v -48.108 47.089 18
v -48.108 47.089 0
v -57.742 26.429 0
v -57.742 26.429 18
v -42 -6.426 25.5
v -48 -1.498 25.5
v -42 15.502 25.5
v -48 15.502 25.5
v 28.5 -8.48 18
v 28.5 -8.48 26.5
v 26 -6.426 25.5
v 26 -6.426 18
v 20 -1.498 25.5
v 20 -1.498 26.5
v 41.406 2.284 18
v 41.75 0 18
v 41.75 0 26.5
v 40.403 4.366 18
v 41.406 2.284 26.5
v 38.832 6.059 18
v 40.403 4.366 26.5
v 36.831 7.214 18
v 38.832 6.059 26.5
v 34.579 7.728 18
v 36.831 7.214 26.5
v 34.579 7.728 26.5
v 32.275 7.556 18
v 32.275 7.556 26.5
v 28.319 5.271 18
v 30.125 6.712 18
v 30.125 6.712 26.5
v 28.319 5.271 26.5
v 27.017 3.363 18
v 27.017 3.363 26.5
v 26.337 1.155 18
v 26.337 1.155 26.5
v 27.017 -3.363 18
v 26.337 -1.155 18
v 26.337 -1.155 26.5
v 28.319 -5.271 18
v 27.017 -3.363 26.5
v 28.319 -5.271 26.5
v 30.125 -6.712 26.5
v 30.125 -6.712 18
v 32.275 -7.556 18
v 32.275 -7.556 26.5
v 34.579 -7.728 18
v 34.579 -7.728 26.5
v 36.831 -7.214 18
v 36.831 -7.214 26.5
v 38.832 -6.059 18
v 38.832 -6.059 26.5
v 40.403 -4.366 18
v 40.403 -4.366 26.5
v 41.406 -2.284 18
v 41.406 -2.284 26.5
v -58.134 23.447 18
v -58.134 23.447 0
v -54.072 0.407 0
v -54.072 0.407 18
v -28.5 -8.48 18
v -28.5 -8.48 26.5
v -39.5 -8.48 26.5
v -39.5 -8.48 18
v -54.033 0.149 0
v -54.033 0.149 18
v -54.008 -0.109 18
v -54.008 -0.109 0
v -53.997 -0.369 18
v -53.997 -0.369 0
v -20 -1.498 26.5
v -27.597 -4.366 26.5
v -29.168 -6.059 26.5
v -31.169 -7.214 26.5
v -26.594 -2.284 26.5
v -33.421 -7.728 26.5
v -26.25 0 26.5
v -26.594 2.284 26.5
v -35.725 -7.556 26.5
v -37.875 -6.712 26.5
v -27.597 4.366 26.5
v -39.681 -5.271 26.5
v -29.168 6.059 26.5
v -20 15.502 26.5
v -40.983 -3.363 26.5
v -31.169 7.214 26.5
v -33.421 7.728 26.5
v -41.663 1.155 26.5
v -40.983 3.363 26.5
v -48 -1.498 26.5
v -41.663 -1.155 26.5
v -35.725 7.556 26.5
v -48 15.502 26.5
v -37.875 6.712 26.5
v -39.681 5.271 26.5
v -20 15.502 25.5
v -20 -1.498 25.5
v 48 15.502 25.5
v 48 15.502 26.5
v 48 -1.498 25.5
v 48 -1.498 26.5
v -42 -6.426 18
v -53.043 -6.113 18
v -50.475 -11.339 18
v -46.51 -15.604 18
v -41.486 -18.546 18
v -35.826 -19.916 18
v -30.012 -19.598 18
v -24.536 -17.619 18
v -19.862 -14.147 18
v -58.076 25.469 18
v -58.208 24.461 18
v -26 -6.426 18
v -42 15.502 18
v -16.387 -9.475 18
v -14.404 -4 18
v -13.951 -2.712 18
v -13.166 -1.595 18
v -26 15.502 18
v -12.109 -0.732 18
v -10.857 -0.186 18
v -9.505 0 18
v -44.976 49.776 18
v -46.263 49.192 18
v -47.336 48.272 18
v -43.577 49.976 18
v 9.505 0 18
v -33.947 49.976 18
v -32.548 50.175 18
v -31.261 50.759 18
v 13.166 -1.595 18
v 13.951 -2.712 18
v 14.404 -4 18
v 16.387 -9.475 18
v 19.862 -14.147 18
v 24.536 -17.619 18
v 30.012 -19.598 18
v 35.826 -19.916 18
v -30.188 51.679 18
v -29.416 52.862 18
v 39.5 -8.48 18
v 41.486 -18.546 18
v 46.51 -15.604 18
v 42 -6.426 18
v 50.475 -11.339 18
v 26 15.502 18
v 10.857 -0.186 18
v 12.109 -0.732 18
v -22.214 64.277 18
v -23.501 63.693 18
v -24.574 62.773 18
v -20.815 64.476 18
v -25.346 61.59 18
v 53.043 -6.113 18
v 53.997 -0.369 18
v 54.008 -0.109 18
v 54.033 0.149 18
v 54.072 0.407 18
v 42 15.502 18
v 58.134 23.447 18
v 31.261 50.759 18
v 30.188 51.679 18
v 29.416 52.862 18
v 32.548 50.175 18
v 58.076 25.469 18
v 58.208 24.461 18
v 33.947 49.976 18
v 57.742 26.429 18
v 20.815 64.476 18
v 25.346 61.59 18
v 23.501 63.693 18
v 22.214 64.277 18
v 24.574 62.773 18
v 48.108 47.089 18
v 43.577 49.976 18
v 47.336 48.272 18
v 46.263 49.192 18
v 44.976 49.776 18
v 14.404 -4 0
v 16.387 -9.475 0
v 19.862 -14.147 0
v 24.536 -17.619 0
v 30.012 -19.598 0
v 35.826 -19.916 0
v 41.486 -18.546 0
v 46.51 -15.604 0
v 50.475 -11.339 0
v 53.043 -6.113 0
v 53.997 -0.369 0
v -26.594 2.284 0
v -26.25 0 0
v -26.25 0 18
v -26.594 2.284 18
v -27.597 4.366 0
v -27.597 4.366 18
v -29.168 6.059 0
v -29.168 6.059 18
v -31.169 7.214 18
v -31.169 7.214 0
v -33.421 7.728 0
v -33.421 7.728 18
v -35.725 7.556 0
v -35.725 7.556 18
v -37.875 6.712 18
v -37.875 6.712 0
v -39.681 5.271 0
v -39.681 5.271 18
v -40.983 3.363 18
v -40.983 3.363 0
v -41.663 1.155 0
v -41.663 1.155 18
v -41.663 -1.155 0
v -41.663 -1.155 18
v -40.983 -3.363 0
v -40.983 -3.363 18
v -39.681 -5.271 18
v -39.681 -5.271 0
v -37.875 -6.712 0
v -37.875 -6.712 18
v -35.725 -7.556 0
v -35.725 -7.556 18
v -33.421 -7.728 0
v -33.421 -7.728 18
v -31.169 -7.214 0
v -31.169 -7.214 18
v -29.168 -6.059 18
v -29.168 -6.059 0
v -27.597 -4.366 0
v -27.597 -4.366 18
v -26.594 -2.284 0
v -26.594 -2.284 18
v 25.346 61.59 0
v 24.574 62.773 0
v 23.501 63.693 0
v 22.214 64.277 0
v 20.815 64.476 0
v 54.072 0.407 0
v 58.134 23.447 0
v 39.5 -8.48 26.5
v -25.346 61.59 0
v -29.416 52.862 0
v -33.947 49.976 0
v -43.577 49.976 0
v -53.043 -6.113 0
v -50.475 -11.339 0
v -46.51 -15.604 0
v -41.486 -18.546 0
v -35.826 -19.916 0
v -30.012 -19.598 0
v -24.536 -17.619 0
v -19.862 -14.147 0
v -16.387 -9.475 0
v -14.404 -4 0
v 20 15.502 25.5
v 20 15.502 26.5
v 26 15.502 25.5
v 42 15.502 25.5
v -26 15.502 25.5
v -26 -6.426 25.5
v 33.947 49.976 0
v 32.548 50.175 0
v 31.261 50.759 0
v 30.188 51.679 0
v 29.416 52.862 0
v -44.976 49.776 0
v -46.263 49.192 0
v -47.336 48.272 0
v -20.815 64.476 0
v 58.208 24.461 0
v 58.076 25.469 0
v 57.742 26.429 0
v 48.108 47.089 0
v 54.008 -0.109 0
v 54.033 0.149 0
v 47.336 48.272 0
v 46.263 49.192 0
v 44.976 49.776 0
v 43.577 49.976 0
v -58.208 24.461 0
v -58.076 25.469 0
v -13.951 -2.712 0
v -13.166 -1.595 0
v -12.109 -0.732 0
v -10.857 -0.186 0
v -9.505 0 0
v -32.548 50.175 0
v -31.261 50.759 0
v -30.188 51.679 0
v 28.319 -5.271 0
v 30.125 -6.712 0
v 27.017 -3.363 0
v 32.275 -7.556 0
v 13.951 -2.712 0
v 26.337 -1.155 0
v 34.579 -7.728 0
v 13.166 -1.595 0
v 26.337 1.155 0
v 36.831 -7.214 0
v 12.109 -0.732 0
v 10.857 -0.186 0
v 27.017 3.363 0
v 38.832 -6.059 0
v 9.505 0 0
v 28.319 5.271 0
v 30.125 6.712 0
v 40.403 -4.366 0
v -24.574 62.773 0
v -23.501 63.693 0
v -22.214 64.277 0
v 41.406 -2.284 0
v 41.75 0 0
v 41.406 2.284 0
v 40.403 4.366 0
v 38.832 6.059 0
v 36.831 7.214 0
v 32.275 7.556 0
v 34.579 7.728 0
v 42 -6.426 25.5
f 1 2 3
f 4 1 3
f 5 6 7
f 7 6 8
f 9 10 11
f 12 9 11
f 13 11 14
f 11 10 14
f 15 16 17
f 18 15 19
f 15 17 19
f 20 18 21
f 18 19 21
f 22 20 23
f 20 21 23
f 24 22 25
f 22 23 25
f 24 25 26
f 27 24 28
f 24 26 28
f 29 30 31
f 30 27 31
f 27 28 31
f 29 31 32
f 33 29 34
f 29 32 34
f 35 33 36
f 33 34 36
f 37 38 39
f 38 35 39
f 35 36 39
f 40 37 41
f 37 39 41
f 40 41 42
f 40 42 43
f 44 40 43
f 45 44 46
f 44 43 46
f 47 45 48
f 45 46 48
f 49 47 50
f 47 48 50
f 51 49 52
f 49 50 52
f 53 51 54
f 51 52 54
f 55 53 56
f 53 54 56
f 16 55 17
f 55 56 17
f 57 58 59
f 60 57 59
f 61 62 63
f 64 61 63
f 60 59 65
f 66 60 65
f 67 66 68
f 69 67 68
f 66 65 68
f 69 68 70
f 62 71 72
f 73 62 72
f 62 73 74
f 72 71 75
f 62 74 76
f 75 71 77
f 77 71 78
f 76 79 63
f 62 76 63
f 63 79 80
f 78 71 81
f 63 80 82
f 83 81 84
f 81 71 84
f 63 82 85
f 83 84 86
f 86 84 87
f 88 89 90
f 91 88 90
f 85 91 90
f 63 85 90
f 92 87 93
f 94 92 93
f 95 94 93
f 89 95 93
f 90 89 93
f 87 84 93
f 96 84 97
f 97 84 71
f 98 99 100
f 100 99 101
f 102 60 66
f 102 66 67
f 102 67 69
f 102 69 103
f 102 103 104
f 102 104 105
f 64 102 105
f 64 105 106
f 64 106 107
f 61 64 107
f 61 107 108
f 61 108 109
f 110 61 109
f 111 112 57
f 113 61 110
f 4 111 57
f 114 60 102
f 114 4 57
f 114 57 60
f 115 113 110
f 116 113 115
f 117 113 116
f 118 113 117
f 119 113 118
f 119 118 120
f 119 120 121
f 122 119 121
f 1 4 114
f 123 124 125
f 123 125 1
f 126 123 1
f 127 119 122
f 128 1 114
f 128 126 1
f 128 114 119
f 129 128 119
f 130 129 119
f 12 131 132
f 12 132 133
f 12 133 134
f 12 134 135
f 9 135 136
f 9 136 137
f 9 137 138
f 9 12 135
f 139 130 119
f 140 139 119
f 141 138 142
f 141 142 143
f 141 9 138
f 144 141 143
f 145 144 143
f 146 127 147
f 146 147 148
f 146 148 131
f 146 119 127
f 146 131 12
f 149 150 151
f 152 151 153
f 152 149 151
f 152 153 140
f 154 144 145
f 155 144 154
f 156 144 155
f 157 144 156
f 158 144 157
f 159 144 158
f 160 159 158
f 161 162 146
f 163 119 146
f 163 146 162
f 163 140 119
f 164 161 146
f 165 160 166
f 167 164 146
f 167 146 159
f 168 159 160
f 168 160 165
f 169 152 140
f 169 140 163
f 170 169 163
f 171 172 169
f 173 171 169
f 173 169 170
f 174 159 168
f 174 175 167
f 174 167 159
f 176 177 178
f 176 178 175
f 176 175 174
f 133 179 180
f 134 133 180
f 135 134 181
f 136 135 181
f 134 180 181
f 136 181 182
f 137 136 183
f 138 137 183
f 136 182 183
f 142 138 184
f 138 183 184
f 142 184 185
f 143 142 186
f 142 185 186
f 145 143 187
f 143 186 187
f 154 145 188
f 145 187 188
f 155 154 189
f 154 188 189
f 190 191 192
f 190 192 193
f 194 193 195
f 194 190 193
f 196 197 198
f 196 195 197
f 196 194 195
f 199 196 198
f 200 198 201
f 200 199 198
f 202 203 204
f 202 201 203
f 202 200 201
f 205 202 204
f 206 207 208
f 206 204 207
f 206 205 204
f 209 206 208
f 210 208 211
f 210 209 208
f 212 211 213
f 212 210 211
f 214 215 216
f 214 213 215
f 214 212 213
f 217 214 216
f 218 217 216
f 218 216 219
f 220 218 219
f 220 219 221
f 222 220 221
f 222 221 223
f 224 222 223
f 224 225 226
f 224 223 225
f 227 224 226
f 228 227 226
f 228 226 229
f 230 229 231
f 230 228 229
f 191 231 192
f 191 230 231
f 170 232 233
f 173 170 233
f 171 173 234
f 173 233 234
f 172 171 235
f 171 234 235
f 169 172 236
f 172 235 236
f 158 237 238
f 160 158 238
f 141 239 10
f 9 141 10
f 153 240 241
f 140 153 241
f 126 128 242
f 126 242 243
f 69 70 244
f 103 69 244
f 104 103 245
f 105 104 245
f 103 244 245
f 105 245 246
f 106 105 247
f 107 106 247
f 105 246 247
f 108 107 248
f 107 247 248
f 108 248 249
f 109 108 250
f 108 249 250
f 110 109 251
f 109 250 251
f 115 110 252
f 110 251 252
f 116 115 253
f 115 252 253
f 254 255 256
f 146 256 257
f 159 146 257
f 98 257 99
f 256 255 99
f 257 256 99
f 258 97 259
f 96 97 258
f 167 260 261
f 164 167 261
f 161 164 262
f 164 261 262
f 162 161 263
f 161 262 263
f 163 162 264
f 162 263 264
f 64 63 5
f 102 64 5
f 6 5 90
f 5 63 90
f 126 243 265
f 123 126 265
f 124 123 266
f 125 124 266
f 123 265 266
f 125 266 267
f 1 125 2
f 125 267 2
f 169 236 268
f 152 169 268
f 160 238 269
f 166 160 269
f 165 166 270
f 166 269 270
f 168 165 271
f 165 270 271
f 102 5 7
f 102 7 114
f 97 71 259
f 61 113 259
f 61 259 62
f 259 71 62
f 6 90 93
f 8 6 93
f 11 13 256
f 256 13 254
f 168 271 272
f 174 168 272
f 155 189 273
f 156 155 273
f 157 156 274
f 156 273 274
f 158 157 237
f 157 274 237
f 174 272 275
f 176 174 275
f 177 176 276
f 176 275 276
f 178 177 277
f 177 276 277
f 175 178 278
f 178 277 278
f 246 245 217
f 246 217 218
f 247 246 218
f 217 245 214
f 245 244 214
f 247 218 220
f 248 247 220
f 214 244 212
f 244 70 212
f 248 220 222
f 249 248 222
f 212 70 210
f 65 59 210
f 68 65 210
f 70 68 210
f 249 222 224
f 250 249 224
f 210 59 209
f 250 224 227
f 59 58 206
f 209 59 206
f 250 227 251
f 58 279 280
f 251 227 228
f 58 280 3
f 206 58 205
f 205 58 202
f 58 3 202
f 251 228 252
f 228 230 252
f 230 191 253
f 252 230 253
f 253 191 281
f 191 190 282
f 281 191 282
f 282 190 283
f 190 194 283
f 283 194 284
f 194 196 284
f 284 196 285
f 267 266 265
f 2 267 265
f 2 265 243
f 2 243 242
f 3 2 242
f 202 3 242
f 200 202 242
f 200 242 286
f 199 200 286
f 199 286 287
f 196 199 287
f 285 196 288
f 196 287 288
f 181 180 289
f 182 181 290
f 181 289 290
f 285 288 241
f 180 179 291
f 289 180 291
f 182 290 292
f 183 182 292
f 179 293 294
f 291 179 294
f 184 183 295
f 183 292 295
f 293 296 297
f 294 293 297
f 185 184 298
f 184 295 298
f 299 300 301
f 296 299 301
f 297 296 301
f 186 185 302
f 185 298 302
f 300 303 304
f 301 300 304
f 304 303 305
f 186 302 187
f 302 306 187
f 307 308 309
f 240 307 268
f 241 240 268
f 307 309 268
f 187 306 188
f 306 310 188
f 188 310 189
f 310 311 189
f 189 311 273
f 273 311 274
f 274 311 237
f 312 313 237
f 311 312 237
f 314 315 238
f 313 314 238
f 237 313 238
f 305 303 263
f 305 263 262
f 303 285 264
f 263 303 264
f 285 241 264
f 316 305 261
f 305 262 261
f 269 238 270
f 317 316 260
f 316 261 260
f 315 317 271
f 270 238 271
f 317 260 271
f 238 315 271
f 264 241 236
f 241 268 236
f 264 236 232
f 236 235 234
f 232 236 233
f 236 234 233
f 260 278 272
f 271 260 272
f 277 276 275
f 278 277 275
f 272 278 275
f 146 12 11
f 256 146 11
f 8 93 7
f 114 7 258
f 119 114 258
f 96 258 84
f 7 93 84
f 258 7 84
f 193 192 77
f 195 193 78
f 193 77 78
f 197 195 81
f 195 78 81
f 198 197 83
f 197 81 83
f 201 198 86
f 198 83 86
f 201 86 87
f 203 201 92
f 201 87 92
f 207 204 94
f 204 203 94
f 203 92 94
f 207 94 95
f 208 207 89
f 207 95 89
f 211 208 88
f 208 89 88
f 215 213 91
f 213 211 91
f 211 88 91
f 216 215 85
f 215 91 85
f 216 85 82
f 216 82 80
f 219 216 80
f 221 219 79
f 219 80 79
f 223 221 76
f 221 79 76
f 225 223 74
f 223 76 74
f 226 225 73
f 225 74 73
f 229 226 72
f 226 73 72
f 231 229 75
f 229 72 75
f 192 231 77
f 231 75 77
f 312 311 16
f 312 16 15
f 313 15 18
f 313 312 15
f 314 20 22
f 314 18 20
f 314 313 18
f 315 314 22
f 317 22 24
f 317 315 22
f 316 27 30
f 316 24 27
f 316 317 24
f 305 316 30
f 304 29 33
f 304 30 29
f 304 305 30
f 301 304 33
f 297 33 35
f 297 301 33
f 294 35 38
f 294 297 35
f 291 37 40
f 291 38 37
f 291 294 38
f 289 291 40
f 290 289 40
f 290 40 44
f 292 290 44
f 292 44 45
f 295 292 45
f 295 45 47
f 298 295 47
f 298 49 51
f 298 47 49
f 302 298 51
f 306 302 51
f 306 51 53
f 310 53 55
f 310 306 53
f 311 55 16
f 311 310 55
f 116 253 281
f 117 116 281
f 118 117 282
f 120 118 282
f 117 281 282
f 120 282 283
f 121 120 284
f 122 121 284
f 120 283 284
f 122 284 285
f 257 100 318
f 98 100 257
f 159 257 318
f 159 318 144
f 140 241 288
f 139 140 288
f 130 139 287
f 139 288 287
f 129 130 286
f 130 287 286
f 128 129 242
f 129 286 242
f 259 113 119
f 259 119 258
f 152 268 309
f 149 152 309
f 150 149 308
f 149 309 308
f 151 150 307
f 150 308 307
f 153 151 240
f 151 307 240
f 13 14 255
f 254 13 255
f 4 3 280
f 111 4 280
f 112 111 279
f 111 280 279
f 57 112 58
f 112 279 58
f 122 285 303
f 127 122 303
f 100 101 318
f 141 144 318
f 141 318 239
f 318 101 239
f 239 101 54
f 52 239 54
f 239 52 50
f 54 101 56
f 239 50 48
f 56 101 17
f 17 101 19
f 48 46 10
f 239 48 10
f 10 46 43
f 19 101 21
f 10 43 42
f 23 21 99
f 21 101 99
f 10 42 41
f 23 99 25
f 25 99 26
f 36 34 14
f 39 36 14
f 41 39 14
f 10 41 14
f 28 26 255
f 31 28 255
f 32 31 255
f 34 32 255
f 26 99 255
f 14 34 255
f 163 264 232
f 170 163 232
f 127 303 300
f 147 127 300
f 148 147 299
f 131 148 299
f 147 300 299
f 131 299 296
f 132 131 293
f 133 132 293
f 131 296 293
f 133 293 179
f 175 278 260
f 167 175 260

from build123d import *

# Parameters (mm, degrees)
CROQUIS1_R                 = 5.5
SALIENTE_EXTRUIR1_DEPTH    = 18
CORTAR_EXTRUIR1_DEPTH      = 89.71111533
CORTAR_EXTRUIR1_DEPTH_BACK = 89.71111533
CROQUIS2_R                 = 7.75
CROQUIS2_R_2               = 5.5
SALIENTE_EXTRUIR2_START    = 8.5
CROQUIS2_6_R               = 7.75
SALIENTE_EXTRUIR2_DEPTH    = 8.5
CROQUIS4_W                 = 7.5
CROQUIS4_H                 = 22.982035645
CORTAR_EXTRUIR2_DEPTH      = 6
CROQUIS5_W                 = 7.5
CROQUIS5_H                 = 22.982035645
CORTAR_EXTRUIR3_DEPTH      = 6


with BuildPart() as part:
    # Croquis1 → Saliente-Extruir1 (new body)
    with BuildSketch(Plane.XY):
        with BuildLine():
            Line((-9.505102572, 0), (9.505102572, 0))
            ThreePointArc((9.505102572, 0), (12.667380232, -1.127016654), (14.404082058, -4))
            ThreePointArc((14.404082058, -4), (35.826374721, -19.916434304), (53.996590294, -0.369292059))
            ThreePointArc((53.996590294, -0.369292059), (54.019000089, 0.020132875), (54.071699102, 0.406625814))
            Line((54.071699102, 0.406625814), (58.134419217, 23.447456541))
            ThreePointArc((58.134419217, 23.447456541), (58.167604759, 24.96832839), (57.741919387, 26.428788738))
            Line((57.741919387, 26.428788738), (48.108079819, 47.088624363))
            ThreePointArc((48.108079819, 47.088624363), (46.263038926, 49.192490284), (43.576540884, 49.975533055))
            Line((43.576540884, 49.975533055), (33.947243492, 49.975533055))
            ThreePointArc((33.947243492, 49.975533055), (31.26074545, 50.758575826), (29.415704557, 52.862441746))
            Line((29.415704557, 52.862441746), (25.346187631, 61.589548956))
            ThreePointArc((25.346187631, 61.589548956), (23.501146738, 63.693414876), (20.814648696, 64.476457647))
            Line((20.814648696, 64.476457647), (-20.814648696, 64.476457647))
            ThreePointArc((-20.814648696, 64.476457647), (-23.501146738, 63.693414876), (-25.346187631, 61.589548956))
            Line((-25.346187631, 61.589548956), (-29.415704557, 52.862441746))
            ThreePointArc((-29.415704557, 52.862441746), (-31.26074545, 50.758575826), (-33.947243492, 49.975533055))
            Line((-33.947243492, 49.975533055), (-43.576540884, 49.975533055))
            ThreePointArc((-43.576540884, 49.975533055), (-46.263038926, 49.192490284), (-48.108079819, 47.088624363))
            Line((-48.108079819, 47.088624363), (-57.741919387, 26.428788738))
            ThreePointArc((-57.741919387, 26.428788738), (-58.167604759, 24.96832839), (-58.134419217, 23.447456541))
            Line((-58.134419217, 23.447456541), (-54.071699102, 0.406625814))
            ThreePointArc((-54.071699102, 0.406625814), (-54.019000089, 0.020132875), (-53.996590294, -0.369292059))
            ThreePointArc((-53.996590294, -0.369292059), (-35.826374721, -19.916434304), (-14.404082058, -4))
            ThreePointArc((-14.404082058, -4), (-12.667380232, -1.127016654), (-9.505102572, 0))
        make_face()
        with Locations((34, 0)):
            Circle(CROQUIS1_R, mode=Mode.SUBTRACT)
        with Locations((-34, 0)):
            Circle(CROQUIS1_R, mode=Mode.SUBTRACT)
    extrude(amount=SALIENTE_EXTRUIR1_DEPTH)

    # Croquis2 → Cortar-Extruir1 (cut, two sides: drawn at the far end of the back side and taken through both)
    # profile 1 of 2: a face of its own
    with BuildSketch(Plane.XY.offset(18).offset(-CORTAR_EXTRUIR1_DEPTH_BACK)):
        with Locations((34, 0)):
            Circle(CROQUIS2_R)
        with Locations((34, 0)):
            Circle(CROQUIS2_R_2, mode=Mode.SUBTRACT)
    # profile 2 of 2: a face of its own
    with BuildSketch(Plane.XY.offset(18).offset(-CORTAR_EXTRUIR1_DEPTH_BACK)):
        with Locations((-34, 0)):
            Circle(CROQUIS2_R)
        with Locations((-34, 0)):
            Circle(CROQUIS2_R_2, mode=Mode.SUBTRACT)
    extrude(amount=CORTAR_EXTRUIR1_DEPTH + CORTAR_EXTRUIR1_DEPTH_BACK, mode=Mode.SUBTRACT)

    # Croquis2<6> → Saliente-Extruir2 (add)
    # profile 1 of 2: a face of its own
    with BuildSketch(Plane.XY.offset(18).offset(SALIENTE_EXTRUIR2_START)):
        Polygon((-48.000069308, 15.502035645), (-19.999930692, 15.502035645), (-19.999930692, -1.497964355), (-28.5, -8.48), (-39.5, -8.48), (-48.000069308, -1.497964355), align=None)
        with Locations((-34, 0)):
            Circle(CROQUIS2_6_R, mode=Mode.SUBTRACT)
    # profile 2 of 2: a face of its own
    with BuildSketch(Plane.XY.offset(18).offset(SALIENTE_EXTRUIR2_START)):
        Polygon((19.999930692, -1.497964355), (19.999930692, 15.502035645), (48.000069308, 15.502035645), (48.000069308, -1.497964355), (39.5, -8.48), (28.5, -8.48), align=None)
        with Locations((34, 0)):
            Circle(CROQUIS2_6_R, mode=Mode.SUBTRACT)
    extrude(amount=-SALIENTE_EXTRUIR2_DEPTH)

    # Croquis4 → Cortar-Extruir2 (cut)
    with BuildSketch(Plane.ZY.offset(-19.999930692)):
        with Locations((21.75, 4.011017823)):
            Rectangle(CROQUIS4_W, CROQUIS4_H)
    cortar_extruir2 = extrude(amount=-CORTAR_EXTRUIR2_DEPTH, mode=Mode.SUBTRACT)

    # Croquis5 → Cortar-Extruir3 (cut)
    with BuildSketch(Plane(origin=(48.000069308, 0, 0), x_dir=(0, 0, -1), z_dir=(1, 0, 0))):
        with Locations((-21.75, 4.011017823)):
            Rectangle(CROQUIS5_W, CROQUIS5_H)
    cortar_extruir3 = extrude(amount=-CORTAR_EXTRUIR3_DEPTH, mode=Mode.SUBTRACT)

    # Simetría1: Cortar-Extruir2, Cortar-Extruir3 across plane
    add(cortar_extruir2.mirror(Plane(origin=(0, 0, 0), x_dir=(0, 0, 1), z_dir=(1, 0, 0))), mode=Mode.SUBTRACT)
    add(cortar_extruir3.mirror(Plane(origin=(0, 0, 0), x_dir=(0, 0, 1), z_dir=(1, 0, 0))), mode=Mode.SUBTRACT)


solid = part.part
